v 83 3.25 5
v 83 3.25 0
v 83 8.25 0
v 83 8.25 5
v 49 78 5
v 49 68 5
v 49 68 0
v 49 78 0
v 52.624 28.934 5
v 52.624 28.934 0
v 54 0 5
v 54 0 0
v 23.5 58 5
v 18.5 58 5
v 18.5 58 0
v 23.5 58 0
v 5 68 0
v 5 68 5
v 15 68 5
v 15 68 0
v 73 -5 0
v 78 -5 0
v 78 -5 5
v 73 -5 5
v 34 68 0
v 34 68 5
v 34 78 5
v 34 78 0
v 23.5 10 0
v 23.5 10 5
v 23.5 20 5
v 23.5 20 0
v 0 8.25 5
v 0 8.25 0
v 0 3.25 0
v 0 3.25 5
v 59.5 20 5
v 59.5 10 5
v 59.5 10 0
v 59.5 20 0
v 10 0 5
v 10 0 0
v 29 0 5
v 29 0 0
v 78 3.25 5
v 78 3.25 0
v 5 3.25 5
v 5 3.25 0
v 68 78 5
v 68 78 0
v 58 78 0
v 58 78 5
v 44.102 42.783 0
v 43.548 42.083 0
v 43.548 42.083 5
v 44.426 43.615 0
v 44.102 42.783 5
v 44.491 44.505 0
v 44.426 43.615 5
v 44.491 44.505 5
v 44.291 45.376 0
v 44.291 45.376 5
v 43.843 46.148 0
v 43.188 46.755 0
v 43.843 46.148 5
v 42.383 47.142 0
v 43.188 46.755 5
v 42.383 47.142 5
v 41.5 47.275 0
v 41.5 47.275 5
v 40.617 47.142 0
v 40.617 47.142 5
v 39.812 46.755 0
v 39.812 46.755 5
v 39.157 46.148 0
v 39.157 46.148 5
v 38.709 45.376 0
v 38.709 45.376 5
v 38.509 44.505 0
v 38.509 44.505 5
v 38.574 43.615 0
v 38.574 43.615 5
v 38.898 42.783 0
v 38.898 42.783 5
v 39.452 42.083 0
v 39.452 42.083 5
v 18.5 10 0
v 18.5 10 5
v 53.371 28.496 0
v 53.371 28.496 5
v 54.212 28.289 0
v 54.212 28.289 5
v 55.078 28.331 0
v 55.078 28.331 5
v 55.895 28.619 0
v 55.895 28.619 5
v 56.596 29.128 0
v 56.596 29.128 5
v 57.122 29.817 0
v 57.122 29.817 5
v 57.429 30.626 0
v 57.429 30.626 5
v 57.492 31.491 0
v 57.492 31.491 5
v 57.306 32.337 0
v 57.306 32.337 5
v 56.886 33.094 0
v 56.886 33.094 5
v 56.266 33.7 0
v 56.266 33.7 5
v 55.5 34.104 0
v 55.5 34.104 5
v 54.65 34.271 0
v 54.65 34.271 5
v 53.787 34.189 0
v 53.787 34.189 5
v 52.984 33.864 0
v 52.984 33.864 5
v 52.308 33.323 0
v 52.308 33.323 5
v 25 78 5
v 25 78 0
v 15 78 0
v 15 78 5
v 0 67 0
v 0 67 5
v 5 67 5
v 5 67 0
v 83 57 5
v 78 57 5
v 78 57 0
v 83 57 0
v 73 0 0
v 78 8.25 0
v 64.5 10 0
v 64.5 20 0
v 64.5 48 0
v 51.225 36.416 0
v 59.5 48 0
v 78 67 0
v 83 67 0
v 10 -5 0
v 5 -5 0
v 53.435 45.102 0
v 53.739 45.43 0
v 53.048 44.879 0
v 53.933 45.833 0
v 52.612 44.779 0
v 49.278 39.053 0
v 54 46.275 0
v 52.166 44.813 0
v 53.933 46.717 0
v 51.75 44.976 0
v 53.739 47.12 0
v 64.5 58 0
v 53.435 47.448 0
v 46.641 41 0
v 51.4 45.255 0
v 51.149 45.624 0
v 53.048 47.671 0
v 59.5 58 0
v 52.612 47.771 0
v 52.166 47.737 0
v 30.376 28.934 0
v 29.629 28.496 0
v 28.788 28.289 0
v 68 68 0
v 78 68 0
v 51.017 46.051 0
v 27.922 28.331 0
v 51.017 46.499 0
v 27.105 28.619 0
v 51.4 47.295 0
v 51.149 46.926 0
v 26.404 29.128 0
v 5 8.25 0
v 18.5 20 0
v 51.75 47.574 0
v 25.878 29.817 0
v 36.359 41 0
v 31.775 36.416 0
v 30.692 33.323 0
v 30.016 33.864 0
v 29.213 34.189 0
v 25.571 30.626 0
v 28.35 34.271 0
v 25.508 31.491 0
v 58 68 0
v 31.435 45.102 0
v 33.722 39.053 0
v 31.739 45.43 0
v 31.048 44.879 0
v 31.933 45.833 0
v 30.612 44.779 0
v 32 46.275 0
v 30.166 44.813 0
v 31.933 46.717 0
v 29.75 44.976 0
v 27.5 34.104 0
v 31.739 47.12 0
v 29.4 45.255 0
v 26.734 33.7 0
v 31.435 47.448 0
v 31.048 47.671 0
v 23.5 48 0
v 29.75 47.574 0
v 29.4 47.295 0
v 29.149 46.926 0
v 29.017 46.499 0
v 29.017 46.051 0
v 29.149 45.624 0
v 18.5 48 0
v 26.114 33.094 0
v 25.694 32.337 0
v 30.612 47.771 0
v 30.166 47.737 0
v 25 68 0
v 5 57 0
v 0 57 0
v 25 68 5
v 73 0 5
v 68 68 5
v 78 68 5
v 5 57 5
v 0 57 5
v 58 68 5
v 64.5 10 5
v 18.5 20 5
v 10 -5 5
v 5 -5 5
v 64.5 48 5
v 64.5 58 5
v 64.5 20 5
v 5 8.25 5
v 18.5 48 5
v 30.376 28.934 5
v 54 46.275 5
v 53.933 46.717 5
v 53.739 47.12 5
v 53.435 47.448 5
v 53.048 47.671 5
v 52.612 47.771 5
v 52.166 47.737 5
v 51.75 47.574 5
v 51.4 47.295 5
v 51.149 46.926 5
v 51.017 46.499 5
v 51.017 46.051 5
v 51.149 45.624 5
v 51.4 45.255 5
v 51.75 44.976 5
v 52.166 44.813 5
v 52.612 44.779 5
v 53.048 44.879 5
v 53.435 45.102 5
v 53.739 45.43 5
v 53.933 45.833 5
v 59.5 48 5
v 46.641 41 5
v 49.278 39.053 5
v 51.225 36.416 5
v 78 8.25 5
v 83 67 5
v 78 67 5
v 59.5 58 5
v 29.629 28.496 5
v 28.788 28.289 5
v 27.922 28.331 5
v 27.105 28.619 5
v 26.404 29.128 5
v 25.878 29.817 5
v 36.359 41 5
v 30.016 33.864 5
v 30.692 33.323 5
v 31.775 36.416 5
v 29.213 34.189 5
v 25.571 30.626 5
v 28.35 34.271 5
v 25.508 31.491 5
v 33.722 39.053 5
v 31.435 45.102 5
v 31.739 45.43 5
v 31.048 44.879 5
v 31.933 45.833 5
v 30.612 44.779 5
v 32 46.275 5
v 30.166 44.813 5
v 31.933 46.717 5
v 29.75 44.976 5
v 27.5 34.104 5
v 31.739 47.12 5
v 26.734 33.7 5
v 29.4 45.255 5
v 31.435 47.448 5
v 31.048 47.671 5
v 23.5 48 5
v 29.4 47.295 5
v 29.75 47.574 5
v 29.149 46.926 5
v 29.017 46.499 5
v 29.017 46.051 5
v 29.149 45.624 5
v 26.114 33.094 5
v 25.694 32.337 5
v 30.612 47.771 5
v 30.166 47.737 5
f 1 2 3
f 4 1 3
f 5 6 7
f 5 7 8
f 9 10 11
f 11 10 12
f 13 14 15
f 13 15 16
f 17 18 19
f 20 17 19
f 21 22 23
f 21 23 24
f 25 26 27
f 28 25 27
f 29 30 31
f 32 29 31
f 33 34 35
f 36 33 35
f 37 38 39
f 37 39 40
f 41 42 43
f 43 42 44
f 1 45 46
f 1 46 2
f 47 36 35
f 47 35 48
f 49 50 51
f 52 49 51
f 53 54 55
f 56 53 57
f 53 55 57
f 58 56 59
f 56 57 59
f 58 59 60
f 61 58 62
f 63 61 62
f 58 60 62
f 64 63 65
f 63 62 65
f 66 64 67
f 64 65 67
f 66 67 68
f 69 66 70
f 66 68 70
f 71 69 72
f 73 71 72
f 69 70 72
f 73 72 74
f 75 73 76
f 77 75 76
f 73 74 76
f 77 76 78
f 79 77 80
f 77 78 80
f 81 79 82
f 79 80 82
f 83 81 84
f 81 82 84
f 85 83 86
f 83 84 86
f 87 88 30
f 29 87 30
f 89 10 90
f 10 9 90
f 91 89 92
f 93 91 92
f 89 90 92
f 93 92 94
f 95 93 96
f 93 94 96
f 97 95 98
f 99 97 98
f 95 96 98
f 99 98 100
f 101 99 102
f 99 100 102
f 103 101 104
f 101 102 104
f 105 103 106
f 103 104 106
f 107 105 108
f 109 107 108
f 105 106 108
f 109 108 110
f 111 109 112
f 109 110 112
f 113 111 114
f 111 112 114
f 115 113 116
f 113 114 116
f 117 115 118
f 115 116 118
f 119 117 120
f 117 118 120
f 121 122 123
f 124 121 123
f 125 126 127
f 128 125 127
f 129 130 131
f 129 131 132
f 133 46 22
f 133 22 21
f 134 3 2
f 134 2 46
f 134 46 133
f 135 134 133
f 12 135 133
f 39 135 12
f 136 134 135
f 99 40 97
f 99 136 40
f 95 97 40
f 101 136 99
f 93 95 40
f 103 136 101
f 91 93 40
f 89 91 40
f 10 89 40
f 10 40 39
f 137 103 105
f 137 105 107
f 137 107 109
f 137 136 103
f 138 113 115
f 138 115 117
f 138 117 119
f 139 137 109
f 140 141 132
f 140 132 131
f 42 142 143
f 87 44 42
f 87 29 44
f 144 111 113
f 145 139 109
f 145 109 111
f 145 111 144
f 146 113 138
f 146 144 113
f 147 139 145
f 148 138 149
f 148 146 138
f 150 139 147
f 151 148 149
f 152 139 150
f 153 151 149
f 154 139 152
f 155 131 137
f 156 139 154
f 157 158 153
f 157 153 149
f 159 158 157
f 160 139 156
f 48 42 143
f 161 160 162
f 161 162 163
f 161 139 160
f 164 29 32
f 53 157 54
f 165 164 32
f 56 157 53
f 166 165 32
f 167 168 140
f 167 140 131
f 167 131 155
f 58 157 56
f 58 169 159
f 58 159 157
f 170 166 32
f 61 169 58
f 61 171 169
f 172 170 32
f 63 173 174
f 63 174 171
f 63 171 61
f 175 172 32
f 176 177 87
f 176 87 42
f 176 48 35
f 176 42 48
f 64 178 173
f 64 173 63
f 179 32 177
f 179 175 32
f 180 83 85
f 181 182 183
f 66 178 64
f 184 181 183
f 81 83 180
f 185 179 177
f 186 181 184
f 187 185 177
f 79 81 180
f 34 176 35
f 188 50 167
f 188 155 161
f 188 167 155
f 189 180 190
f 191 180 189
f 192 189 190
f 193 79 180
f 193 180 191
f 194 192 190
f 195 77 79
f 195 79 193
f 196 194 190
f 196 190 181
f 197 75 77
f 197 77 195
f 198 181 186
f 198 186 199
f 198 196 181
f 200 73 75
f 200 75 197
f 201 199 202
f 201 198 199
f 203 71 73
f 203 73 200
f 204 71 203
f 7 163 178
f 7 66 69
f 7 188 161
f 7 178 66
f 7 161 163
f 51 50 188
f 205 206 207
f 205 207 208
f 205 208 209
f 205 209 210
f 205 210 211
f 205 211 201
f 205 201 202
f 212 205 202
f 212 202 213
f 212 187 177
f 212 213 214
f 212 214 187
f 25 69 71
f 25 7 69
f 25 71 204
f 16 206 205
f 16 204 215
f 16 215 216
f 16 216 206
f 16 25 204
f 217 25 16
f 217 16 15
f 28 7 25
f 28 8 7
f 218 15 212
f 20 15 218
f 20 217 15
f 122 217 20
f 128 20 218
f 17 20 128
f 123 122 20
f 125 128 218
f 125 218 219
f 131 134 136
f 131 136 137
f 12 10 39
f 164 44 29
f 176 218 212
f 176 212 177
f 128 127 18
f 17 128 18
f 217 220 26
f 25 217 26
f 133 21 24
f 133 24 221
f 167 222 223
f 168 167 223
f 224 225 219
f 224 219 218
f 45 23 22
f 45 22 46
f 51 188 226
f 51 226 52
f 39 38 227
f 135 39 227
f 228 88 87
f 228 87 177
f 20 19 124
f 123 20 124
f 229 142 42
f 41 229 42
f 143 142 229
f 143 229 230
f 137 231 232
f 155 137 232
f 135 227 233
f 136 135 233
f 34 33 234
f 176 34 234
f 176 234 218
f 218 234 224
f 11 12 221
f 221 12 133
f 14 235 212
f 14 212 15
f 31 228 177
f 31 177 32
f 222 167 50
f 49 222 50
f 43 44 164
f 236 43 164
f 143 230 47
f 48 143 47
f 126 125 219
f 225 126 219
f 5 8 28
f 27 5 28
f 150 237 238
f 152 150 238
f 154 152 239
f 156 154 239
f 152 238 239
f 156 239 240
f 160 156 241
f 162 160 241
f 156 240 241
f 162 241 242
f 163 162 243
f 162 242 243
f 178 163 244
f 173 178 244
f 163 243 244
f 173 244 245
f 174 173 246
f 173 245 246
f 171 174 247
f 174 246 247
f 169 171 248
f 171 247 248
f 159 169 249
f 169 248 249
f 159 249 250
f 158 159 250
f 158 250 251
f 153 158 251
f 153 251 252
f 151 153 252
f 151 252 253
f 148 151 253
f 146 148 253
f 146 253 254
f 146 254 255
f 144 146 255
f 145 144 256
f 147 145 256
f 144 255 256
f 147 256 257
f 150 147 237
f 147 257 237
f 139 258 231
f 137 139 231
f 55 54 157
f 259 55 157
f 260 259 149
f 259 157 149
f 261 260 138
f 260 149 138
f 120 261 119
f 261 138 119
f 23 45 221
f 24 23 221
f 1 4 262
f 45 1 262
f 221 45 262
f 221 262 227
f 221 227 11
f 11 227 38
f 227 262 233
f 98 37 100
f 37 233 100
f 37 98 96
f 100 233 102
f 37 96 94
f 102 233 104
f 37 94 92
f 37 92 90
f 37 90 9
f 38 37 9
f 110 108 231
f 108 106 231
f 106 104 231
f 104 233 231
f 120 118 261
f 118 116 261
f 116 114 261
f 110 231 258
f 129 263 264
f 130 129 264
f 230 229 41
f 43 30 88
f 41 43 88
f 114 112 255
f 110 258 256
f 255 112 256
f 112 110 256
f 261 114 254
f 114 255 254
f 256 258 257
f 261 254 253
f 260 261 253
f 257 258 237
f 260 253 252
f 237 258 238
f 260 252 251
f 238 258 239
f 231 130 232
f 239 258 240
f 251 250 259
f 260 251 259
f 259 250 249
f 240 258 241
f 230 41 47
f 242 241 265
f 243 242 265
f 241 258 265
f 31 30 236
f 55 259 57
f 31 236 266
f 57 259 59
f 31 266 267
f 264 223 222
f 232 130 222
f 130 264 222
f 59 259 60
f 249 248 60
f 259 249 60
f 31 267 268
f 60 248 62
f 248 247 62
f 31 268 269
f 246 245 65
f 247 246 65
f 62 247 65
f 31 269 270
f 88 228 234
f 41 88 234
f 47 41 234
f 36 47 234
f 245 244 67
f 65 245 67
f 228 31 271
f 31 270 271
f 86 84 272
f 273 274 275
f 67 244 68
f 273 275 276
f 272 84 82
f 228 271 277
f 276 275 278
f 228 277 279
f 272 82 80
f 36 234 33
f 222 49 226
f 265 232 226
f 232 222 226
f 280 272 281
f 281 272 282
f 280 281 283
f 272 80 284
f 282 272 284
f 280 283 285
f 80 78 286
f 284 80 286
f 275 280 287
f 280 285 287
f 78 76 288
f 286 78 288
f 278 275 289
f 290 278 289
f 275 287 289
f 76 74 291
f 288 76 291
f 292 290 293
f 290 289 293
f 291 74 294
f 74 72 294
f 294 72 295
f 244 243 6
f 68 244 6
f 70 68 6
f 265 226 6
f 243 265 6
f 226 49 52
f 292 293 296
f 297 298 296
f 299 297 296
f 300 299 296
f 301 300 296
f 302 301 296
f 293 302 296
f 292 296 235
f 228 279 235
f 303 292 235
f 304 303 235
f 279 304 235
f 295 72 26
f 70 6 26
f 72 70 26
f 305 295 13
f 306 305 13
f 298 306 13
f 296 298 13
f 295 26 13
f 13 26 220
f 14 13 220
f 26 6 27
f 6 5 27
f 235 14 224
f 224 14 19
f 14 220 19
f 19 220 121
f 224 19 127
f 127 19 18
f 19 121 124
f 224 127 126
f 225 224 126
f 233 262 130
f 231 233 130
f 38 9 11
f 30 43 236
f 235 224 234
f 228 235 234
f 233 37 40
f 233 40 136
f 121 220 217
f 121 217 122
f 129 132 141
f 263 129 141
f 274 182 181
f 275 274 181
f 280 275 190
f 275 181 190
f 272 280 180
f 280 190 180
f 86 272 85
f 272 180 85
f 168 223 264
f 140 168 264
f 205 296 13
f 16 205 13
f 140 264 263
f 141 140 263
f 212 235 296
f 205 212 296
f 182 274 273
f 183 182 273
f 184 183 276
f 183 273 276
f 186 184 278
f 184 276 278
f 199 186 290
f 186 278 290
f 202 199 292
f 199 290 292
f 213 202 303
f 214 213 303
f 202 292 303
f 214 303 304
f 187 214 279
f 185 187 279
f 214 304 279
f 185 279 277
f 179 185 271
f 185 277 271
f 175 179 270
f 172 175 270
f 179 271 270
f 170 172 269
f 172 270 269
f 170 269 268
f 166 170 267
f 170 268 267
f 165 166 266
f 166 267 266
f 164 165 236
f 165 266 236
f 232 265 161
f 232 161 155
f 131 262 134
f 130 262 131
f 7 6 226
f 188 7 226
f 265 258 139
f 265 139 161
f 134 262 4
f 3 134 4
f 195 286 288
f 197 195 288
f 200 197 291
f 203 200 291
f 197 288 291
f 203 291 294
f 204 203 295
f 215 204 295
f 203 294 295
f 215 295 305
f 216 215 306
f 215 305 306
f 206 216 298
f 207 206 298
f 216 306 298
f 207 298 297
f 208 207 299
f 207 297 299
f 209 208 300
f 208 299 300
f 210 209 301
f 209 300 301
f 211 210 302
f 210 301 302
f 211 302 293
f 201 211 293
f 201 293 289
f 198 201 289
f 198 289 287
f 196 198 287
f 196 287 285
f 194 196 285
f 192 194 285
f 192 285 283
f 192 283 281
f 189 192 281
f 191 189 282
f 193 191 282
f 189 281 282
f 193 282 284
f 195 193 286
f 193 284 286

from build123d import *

# Parameters (mm, degrees)
BOSS_EXTRU_1_DEPTH      = 5
ESQUISSE3_R             = 3
ESQUISSE3_W             = 5
ESQUISSE3_H             = 48.75
ESQUISSE3_H_2           = 3.25
ESQUISSE3_H_3           = 10
ESQUISSE3_W_2           = 9
ESQUISSE3_H_4           = 5
ENL_V_MAT_EXTRU_1_DEPTH = 5
ESQUISSE4_W             = 10
ESQUISSE4_H             = 5
ESQUISSE4_W_2           = 15
ESQUISSE4_W_3           = 5
BOSS_EXTRU_2_DEPTH      = 5
ESQUISSE5_R             = 1.5
ENL_V_MAT_EXTRU_2_DEPTH = 5


with BuildPart() as part:
    # Esquisse1 → Boss.-Extru.1 (new body)
    with BuildSketch(Plane.XY):
        with BuildLine():
            Line((0, 0), (29, 0))
            Line((29, 0), (30.512421766, 31.797613203))
            ThreePointArc((30.512421766, 31.797613203), (41.5, 42.275), (52.487578234, 31.797613203))
            Line((52.487578234, 31.797613203), (54, 0))
            Line((54, 0), (83, 0))
            Line((83, 0), (83, 73))
            Line((83, 73), (0, 73))
            Line((0, 73), (0, 0))
        make_face()
    extrude(amount=BOSS_EXTRU_1_DEPTH)

    # Esquisse3 → Enlèv. mat.-Extru.1 (cut)
    with BuildSketch(Plane.XY.offset(5)):
        with Locations((41.5, 44.275)):
            Circle(ESQUISSE3_R)
        with Locations((54.5, 31.275)):
            Circle(ESQUISSE3_R)
        with Locations((28.5, 31.275)):
            Circle(ESQUISSE3_R)
        Polygon((15, 73), (0, 73), (0, 67), (5, 67), (5, 68), (15, 68), align=None)
        Polygon((78, 67), (83, 67), (83, 73), (68, 73), (68, 68), (78, 68), align=None)
        with Locations((2.5, 32.625)):
            Rectangle(ESQUISSE3_W, ESQUISSE3_H)
        with Locations((2.5, 1.625)):
            Rectangle(ESQUISSE3_W, ESQUISSE3_H_2)
        with Locations((80.5, 1.625)):
            Rectangle(ESQUISSE3_W, ESQUISSE3_H_2)
        with Locations((80.5, 32.625)):
            Rectangle(ESQUISSE3_W, ESQUISSE3_H)
        with Locations((62, 15)):
            Rectangle(ESQUISSE3_W, ESQUISSE3_H_3)
        with Locations((21, 53)):
            Rectangle(ESQUISSE3_W, ESQUISSE3_H_3)
        with Locations((21, 15)):
            Rectangle(ESQUISSE3_W, ESQUISSE3_H_3)
        with Locations((62, 53)):
            Rectangle(ESQUISSE3_W, ESQUISSE3_H_3)
        with Locations((53.5, 70.5)):
            Rectangle(ESQUISSE3_W_2, ESQUISSE3_H_4)
        with Locations((29.5, 70.5)):
            Rectangle(ESQUISSE3_W_2, ESQUISSE3_H_4)
    extrude(amount=-ENL_V_MAT_EXTRU_1_DEPTH, mode=Mode.SUBTRACT)

    # Esquisse4 → Boss.-Extru.2 (add)
    with BuildSketch(Plane(origin=(0, 0, 0), x_dir=(-1, 0, 0), z_dir=(0, 0, -1))):
        with Locations((-63, 75.5)):
            Rectangle(ESQUISSE4_W, ESQUISSE4_H)
        with Locations((-41.5, 75.5)):
            Rectangle(ESQUISSE4_W_2, ESQUISSE4_H)
        with Locations((-20, 75.5)):
            Rectangle(ESQUISSE4_W, ESQUISSE4_H)
        with Locations((-75.5, -2.5)):
            Rectangle(ESQUISSE4_W_3, ESQUISSE4_H)
        with Locations((-7.5, -2.5)):
            Rectangle(ESQUISSE4_W_3, ESQUISSE4_H)
    extrude(amount=-BOSS_EXTRU_2_DEPTH)

    # Esquisse5 → Enlèv. mat.-Extru.2 (cut)
    with BuildSketch(Plane.XY.offset(5)):
        with Locations((52.5, 46.275)):
            Circle(ESQUISSE5_R)
        with Locations((30.5, 46.275)):
            Circle(ESQUISSE5_R)
    extrude(amount=-ENL_V_MAT_EXTRU_2_DEPTH, mode=Mode.SUBTRACT)


solid = part.part
